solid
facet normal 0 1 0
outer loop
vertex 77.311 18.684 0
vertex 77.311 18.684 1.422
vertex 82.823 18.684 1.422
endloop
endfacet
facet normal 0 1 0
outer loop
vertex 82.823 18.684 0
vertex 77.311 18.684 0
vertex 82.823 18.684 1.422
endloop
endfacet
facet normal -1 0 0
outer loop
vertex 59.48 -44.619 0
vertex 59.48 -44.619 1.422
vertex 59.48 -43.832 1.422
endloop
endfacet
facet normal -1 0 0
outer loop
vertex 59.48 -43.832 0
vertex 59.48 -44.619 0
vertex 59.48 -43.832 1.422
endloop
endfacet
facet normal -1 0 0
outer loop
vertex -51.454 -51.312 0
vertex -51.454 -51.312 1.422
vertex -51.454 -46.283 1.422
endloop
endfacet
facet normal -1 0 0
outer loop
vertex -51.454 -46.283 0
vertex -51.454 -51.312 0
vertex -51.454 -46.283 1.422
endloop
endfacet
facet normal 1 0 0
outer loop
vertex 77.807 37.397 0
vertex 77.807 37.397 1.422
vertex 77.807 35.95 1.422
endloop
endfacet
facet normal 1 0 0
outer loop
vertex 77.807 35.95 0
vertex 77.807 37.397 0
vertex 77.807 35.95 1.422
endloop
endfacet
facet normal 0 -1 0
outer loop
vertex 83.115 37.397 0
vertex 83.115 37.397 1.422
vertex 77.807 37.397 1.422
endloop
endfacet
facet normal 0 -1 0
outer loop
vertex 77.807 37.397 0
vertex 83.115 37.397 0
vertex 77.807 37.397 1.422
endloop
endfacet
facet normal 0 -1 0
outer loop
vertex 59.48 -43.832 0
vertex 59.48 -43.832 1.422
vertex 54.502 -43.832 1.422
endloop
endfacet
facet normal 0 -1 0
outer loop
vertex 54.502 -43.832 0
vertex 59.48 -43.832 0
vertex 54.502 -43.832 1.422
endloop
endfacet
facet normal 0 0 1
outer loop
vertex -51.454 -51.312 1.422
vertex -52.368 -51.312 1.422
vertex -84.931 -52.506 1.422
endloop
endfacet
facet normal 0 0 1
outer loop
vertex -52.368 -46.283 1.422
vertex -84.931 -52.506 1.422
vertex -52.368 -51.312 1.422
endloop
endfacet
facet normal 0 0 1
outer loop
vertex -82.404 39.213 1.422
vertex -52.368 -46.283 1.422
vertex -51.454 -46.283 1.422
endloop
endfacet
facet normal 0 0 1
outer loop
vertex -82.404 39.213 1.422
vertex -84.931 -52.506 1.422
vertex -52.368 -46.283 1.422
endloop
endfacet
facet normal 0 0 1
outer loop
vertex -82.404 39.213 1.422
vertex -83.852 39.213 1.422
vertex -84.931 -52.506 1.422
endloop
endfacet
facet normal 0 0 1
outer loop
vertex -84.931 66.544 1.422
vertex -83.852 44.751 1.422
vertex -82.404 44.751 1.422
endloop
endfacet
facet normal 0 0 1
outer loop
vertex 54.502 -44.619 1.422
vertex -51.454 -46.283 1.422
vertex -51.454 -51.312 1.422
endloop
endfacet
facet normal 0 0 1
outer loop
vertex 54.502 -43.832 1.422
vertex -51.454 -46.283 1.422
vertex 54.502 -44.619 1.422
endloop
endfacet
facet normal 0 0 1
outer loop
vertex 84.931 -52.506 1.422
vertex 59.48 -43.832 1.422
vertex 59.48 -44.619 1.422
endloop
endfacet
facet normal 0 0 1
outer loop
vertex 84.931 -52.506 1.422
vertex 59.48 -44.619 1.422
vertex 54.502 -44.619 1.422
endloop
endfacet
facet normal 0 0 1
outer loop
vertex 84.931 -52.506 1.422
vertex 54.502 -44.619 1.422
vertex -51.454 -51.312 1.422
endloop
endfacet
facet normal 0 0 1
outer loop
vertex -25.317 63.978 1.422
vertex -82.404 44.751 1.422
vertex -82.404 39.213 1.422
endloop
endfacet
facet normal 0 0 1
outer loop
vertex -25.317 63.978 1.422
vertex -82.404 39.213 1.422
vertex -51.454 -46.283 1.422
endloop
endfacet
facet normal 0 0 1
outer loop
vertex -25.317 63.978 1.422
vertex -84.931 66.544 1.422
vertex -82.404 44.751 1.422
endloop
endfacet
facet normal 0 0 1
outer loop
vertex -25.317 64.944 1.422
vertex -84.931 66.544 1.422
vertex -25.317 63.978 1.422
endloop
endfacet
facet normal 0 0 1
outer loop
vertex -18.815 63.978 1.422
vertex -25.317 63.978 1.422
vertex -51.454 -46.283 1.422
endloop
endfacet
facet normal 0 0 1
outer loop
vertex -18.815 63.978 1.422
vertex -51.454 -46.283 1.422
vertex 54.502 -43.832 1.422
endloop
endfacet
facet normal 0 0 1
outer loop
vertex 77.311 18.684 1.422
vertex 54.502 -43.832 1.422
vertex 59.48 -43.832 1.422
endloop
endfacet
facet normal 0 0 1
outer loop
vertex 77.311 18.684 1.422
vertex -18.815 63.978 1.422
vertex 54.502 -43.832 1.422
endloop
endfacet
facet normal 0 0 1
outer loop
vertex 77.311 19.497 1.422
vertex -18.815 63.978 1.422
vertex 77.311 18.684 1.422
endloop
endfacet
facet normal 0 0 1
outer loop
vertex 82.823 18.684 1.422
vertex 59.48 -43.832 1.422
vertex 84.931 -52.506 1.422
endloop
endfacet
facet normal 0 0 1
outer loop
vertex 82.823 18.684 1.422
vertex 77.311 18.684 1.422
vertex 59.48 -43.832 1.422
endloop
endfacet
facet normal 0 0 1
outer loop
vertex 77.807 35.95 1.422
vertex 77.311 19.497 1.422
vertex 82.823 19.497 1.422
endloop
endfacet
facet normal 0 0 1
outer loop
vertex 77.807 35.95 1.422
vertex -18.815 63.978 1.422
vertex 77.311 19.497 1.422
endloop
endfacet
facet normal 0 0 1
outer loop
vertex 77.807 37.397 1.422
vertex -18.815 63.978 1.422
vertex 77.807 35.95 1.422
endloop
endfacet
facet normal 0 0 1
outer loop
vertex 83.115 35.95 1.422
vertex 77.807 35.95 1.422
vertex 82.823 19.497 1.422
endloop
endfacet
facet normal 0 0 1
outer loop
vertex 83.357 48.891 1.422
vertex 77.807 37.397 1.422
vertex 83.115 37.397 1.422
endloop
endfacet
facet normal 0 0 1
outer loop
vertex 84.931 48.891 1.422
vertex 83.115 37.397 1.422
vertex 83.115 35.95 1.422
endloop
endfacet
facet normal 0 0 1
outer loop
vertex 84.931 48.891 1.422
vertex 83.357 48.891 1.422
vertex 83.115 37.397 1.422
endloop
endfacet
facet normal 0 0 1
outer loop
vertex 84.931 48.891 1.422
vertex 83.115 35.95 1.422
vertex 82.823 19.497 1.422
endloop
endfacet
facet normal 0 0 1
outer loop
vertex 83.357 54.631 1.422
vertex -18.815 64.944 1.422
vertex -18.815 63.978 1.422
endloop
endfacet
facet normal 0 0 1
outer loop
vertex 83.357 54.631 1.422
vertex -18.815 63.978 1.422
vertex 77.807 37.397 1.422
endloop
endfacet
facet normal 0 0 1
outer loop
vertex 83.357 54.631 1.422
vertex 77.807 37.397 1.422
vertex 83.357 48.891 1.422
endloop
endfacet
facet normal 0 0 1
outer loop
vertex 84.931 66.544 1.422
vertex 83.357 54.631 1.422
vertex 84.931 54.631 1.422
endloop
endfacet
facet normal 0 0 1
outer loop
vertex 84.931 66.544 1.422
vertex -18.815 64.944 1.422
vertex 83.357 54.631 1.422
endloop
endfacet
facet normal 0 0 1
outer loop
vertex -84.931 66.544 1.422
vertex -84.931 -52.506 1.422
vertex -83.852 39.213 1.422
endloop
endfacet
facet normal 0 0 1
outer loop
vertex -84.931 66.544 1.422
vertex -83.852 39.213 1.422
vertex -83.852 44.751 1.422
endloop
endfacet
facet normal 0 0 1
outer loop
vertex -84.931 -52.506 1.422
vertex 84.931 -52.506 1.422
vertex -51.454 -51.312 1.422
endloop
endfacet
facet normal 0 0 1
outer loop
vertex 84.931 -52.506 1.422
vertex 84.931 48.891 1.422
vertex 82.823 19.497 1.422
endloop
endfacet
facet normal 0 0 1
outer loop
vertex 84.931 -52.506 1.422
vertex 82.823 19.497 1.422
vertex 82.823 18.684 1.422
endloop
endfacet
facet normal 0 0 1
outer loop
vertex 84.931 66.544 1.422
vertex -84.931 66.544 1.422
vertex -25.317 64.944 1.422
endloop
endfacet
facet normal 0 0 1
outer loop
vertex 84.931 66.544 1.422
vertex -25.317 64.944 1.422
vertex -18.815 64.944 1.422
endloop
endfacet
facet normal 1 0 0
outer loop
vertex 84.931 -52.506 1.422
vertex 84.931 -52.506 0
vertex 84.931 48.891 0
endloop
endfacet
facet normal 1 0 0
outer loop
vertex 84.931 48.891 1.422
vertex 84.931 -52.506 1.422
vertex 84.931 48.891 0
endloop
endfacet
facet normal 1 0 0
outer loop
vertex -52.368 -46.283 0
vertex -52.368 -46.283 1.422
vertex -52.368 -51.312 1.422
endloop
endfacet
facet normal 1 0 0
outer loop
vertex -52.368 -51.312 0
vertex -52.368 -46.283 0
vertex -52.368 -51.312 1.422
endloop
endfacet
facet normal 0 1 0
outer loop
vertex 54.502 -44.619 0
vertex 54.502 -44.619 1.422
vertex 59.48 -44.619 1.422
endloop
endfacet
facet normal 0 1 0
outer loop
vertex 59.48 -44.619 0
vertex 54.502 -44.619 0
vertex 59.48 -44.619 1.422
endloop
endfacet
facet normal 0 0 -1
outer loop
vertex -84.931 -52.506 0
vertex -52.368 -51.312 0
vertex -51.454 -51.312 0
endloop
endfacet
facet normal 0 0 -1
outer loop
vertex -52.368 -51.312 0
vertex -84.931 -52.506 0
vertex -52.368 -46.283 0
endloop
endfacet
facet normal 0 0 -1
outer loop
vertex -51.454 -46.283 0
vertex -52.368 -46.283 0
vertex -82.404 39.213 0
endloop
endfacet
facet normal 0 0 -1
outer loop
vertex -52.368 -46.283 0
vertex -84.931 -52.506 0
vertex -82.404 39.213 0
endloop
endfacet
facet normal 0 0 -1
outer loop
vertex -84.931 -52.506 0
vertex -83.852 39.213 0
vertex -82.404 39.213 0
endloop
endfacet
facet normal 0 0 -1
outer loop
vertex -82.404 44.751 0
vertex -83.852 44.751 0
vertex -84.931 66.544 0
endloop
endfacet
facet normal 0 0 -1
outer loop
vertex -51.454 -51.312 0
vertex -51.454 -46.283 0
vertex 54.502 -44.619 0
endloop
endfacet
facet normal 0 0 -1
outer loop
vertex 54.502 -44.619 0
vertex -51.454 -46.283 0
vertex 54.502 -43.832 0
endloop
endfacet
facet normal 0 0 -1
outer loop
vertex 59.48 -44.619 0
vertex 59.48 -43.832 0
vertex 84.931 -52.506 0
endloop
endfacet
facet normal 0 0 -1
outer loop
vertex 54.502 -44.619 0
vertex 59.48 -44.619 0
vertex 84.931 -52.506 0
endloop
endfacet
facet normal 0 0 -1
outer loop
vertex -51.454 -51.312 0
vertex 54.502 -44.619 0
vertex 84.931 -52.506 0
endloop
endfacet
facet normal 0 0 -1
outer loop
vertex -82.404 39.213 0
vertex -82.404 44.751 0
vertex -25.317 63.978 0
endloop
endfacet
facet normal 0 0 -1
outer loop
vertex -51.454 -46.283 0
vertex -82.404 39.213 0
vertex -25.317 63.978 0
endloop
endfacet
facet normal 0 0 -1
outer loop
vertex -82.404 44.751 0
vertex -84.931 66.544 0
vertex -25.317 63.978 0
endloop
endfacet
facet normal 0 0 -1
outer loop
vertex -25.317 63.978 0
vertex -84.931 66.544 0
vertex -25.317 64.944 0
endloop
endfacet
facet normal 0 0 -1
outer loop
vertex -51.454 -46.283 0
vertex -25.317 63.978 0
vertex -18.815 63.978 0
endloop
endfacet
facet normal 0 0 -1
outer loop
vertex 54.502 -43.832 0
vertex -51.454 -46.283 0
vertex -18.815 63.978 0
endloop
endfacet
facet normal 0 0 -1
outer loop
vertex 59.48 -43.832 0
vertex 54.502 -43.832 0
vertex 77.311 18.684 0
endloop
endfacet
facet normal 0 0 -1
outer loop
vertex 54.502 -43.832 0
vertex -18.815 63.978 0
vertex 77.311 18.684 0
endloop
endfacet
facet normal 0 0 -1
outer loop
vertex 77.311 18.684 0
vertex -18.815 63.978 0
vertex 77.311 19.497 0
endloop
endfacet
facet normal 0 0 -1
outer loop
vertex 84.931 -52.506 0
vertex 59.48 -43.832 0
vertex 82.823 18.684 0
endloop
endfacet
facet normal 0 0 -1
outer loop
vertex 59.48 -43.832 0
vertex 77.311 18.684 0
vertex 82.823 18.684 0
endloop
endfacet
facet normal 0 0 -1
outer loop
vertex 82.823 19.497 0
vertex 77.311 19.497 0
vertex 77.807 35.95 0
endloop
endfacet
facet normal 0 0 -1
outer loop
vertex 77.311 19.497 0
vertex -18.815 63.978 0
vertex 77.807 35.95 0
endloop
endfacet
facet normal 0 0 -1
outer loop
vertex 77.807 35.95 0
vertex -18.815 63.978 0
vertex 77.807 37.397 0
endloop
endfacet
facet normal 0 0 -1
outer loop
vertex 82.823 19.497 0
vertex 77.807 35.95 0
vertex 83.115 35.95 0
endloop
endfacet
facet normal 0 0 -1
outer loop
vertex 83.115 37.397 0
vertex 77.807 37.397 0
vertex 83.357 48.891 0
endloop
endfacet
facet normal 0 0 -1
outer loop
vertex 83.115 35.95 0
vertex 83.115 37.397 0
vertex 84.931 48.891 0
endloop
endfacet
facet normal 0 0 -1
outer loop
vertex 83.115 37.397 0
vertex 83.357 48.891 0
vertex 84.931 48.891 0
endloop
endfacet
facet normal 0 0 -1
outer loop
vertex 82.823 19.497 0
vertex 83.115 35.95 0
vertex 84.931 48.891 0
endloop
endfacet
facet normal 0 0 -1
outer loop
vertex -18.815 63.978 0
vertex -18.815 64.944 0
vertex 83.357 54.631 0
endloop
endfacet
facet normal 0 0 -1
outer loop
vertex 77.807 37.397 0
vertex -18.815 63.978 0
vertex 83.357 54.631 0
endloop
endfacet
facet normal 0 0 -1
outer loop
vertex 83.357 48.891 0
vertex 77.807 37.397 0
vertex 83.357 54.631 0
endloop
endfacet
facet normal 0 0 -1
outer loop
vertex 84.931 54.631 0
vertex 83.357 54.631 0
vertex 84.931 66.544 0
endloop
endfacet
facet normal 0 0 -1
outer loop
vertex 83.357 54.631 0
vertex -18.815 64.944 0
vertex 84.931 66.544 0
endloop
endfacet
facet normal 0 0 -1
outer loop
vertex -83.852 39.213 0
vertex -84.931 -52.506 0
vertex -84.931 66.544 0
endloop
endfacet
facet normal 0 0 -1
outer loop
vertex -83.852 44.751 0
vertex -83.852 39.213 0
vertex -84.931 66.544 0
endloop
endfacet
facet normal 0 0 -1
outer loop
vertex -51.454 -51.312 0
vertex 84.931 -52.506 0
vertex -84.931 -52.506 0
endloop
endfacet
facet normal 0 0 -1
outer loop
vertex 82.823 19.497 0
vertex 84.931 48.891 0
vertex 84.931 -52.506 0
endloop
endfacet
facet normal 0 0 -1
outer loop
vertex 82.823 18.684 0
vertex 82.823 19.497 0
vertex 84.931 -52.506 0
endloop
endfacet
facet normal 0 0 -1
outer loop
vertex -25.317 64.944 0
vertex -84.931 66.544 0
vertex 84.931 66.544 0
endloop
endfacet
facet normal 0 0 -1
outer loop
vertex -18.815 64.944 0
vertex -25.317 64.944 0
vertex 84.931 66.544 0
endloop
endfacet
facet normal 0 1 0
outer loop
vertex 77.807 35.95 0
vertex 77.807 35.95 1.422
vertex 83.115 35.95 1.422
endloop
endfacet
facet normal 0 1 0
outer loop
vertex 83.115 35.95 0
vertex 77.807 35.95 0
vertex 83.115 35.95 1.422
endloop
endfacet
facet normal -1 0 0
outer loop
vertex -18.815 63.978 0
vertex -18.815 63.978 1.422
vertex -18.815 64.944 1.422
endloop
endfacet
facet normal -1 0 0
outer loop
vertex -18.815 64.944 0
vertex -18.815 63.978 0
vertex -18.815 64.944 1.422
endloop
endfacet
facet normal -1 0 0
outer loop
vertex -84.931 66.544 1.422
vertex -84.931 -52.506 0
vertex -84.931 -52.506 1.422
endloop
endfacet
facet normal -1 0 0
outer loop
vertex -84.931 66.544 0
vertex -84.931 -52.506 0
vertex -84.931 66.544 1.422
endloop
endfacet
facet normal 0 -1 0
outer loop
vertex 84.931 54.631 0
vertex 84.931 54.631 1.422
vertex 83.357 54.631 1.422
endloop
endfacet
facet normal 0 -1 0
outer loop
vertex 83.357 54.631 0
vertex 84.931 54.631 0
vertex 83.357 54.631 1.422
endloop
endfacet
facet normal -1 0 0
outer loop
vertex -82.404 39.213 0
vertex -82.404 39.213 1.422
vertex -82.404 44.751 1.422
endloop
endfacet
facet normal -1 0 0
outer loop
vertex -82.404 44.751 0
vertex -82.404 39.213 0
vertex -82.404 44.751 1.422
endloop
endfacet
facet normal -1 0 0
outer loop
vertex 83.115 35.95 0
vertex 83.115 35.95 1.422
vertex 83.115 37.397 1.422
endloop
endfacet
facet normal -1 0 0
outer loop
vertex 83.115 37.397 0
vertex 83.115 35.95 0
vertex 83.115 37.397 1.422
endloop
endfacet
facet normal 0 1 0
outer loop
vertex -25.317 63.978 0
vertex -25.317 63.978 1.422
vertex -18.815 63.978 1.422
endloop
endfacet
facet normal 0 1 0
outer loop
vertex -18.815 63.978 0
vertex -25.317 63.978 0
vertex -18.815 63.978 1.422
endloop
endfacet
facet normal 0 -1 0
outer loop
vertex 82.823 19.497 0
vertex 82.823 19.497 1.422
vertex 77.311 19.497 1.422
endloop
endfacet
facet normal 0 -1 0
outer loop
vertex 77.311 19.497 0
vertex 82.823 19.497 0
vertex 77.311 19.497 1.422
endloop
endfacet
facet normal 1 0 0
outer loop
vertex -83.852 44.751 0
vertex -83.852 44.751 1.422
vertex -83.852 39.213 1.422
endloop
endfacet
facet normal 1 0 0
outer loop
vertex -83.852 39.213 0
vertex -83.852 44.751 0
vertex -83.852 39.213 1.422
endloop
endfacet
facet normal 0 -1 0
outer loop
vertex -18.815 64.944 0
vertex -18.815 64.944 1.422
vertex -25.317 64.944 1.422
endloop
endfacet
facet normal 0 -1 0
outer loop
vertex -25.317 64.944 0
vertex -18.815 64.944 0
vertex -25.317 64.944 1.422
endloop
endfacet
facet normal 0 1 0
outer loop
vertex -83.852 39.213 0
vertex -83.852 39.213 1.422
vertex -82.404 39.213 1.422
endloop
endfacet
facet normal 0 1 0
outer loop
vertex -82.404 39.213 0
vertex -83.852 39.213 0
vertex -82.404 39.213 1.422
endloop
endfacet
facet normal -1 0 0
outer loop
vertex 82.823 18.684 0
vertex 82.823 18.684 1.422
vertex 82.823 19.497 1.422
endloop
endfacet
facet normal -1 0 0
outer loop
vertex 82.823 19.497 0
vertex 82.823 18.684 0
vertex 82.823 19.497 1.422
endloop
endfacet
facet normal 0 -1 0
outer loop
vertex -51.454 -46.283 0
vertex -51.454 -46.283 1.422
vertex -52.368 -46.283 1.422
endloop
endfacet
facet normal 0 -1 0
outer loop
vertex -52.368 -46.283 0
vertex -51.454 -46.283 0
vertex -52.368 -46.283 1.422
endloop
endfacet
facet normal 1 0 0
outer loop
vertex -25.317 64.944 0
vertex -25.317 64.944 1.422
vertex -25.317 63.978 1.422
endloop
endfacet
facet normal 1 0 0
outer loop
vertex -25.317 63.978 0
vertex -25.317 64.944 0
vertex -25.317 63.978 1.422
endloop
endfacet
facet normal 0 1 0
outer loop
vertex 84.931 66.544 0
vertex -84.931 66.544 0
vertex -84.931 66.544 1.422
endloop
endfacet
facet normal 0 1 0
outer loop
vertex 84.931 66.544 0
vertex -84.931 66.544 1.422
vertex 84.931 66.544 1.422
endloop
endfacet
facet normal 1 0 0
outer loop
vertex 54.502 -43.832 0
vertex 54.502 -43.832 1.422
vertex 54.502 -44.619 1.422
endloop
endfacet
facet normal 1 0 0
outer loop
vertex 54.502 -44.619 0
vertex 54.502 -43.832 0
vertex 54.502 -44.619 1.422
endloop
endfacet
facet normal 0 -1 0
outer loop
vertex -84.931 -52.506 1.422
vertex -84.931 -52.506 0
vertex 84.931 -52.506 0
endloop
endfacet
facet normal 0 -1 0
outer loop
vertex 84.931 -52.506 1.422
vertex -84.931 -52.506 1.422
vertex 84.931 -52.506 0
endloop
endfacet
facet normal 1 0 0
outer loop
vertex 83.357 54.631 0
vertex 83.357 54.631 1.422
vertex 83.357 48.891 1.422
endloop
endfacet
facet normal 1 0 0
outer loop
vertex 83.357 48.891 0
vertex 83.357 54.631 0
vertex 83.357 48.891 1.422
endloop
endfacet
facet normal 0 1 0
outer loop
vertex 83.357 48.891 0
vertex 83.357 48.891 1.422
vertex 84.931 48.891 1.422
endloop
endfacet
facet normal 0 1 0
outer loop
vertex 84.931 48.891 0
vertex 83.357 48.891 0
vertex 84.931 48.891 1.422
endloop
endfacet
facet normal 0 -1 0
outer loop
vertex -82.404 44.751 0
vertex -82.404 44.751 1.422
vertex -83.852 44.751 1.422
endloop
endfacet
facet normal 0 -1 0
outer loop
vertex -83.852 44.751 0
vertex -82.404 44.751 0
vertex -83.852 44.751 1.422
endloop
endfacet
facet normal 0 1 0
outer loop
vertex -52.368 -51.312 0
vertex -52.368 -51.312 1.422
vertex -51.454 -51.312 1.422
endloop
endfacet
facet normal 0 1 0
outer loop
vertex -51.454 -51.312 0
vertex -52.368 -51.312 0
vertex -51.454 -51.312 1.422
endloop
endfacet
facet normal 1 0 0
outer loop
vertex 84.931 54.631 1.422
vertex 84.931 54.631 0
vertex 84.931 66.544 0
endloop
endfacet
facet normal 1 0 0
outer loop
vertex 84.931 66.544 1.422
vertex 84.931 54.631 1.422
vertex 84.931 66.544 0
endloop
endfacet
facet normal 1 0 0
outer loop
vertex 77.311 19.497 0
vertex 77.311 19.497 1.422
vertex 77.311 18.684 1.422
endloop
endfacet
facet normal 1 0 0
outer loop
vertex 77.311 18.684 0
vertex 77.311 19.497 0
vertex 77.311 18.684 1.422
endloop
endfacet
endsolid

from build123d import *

# Parameters (mm, degrees)
F0_W     = 169.8625
F0_H     = 119.0498
F1_DEPTH = 1.4224
F2_W     = 2.4892
F2_H     = 0.3937
F2_W_2   = 0.4572
F2_H_2   = 2.5146
F2_W_3   = 0.7239
F2_H_3   = 2.7686
F2_W_4   = 3.2512
F2_H_4   = 0.4826
F2_W_5   = 2.3622
F2_H_5   = 0.7239
F2_W_6   = 0.2921
F3_DEPTH = 25.4


with BuildPart() as f1:
    # F0 (on Top) → F1 (new body)
    with BuildSketch(Plane.XY):
        with Locations((3e-06, 7.018937)):
            Rectangle(F0_W, F0_H)
    extrude(amount=F1_DEPTH)

    # F2 (on face) → F3 (cut)
    with BuildSketch(Plane.XY.offset(1.4224)):
        with Locations((58.235853, -44.422413)):
            Rectangle(F2_W, F2_H)
        Polygon((56.991253, -44.225563), (59.480453, -44.225563), (59.480453, -43.831863), (54.502053, -43.831863), (54.502053, -44.619263), (56.991253, -44.619263), align=None)
        Polygon((-52.368447, -46.282963), (-52.368447, -48.797563), (-51.911247, -48.797563), (-51.911247, -51.312163), (-51.454047, -51.312163), (-51.454047, -46.282963), align=None)
        with Locations((-52.139847, -50.054863)):
            Rectangle(F2_W_2, F2_H_2)
        Polygon((-82.403947, 44.750637), (-83.127847, 44.750637), (-83.127847, 41.982037), (-83.851747, 41.982037), (-83.851747, 39.213437), (-82.403947, 39.213437), align=None)
        with Locations((-83.489797, 43.366337)):
            Rectangle(F2_W_3, F2_H_3)
        with Locations((-23.691847, 64.702337)):
            Rectangle(F2_W_4, F2_H_4)
        Polygon((-22.066247, 64.461037), (-25.317447, 64.461037), (-25.317447, 63.978437), (-18.815047, 63.978437), (-18.815047, 64.943637), (-22.066247, 64.943637), align=None)
        Polygon((83.357312, 48.890837), (86.297356, 48.890837), (86.297356, 54.631237), (84.827334, 54.631237), (83.357312, 54.631237), align=None)
        with Locations((81.641953, 37.035387)):
            Rectangle(F2_W_5, F2_H_5)
        Polygon((82.823053, 19.172837), (82.823053, 19.49709), (77.311253, 19.49709), (77.311253, 18.68429), (82.823053, 18.68429), align=None)
        Polygon((80.460853, 36.673437), (80.460853, 37.397337), (77.806553, 37.397337), (77.806553, 35.949537), (82.823053, 35.949537), (82.823053, 36.673437), align=None)
        with Locations((82.969103, 37.035387)):
            Rectangle(F2_W_6, F2_H_5)
        with Locations((82.969103, 36.311487)):
            Rectangle(F2_W_6, F2_H_5)
    extrude(amount=-F3_DEPTH, mode=Mode.SUBTRACT)


solid = f1.part
